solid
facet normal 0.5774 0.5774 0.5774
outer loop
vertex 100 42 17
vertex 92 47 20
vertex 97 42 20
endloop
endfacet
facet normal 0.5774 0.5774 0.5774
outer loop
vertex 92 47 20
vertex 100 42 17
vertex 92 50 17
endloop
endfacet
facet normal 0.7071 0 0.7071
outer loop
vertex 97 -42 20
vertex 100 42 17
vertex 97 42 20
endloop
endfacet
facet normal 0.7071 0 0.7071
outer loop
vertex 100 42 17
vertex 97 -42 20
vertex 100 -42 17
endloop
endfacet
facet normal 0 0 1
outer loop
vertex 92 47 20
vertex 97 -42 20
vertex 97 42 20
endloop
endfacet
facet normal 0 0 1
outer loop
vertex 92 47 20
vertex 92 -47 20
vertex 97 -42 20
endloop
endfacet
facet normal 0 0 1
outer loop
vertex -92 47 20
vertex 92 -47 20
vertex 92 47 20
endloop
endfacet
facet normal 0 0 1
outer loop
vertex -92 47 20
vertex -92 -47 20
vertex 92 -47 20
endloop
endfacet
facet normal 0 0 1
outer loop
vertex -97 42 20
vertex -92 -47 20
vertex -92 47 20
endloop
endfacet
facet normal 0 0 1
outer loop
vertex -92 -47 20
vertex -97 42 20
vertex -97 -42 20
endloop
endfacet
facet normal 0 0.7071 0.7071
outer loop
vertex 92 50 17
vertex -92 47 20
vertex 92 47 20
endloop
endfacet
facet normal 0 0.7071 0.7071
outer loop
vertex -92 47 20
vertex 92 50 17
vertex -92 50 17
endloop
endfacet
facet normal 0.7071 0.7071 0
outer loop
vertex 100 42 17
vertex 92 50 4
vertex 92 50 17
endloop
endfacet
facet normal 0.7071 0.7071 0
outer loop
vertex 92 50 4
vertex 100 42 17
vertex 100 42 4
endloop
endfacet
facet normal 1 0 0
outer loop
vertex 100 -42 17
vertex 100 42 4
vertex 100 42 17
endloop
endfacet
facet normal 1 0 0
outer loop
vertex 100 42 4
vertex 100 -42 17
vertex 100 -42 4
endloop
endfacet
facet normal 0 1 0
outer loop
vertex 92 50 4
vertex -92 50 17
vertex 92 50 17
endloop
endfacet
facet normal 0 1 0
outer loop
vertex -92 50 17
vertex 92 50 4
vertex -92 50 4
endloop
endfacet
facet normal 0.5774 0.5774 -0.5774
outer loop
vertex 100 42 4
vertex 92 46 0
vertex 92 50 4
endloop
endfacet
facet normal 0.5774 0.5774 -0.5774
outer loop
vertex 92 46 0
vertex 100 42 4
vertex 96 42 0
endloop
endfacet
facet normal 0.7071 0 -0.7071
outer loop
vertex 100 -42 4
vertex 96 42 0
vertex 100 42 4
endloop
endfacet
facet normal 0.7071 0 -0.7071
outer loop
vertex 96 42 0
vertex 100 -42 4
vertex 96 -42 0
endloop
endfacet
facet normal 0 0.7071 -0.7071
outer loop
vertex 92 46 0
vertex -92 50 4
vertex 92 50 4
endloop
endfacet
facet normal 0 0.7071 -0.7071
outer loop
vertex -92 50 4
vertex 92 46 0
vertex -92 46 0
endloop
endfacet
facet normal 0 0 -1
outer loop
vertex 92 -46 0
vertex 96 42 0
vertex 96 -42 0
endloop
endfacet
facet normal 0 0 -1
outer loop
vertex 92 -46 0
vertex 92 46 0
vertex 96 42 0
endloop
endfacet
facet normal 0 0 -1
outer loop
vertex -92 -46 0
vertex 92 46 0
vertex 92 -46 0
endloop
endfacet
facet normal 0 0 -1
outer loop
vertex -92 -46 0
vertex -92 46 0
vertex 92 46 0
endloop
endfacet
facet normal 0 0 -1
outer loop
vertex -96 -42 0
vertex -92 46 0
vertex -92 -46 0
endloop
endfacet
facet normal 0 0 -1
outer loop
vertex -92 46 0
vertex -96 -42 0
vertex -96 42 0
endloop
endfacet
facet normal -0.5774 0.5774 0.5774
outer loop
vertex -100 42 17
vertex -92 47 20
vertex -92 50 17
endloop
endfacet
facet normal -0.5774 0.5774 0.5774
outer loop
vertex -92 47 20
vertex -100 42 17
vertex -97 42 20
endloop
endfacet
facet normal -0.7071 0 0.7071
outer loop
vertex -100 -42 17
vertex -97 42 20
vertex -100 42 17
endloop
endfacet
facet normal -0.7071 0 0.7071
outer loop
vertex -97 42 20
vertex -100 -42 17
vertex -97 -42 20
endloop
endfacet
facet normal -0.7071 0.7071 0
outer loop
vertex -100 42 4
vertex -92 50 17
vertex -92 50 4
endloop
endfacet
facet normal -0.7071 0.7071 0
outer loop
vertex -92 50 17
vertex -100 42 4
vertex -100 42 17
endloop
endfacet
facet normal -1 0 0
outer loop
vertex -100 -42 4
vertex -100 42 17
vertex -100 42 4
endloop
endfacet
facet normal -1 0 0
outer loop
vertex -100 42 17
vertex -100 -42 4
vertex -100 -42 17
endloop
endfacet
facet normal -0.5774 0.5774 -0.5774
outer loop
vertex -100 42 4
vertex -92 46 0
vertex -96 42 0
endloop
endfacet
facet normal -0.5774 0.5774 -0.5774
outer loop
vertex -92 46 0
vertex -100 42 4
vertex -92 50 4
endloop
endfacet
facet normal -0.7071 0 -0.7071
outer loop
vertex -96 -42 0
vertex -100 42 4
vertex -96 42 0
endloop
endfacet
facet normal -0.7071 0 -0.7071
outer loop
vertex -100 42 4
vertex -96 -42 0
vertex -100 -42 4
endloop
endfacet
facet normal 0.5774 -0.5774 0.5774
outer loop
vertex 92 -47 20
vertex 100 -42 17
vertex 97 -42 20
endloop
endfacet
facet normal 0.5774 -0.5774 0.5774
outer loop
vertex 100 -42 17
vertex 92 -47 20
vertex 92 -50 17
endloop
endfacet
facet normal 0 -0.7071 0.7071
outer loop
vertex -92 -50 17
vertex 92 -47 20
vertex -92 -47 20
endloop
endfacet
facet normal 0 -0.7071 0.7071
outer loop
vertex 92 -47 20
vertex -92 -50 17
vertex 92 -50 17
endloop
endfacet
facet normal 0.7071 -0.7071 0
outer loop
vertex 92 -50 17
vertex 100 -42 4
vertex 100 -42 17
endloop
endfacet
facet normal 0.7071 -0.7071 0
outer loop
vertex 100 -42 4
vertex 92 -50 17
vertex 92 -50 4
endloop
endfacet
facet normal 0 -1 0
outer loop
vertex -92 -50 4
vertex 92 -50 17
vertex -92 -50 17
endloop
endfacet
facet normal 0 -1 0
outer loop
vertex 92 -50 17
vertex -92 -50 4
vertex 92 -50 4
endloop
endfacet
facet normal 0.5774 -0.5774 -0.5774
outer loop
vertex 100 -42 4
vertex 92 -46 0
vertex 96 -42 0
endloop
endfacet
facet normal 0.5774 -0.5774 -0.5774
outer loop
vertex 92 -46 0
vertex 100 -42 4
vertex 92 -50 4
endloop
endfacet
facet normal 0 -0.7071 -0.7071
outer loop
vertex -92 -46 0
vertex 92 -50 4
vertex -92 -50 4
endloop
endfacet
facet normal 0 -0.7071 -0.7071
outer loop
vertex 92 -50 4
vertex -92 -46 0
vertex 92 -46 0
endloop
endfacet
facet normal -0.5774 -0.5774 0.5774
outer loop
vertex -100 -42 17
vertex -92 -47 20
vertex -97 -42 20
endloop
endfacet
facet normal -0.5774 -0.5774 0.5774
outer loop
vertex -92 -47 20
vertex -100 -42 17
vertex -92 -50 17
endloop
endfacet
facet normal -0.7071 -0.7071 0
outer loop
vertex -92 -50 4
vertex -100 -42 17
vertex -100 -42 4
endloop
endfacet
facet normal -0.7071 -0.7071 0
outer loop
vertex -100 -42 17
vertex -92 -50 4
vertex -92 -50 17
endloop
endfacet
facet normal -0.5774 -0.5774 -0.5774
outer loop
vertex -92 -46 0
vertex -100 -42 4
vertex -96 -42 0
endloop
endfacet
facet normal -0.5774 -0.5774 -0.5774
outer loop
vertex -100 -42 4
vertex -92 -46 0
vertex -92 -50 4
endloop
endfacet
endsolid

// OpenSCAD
dim = [200, 100, 20];
bevel_top  = [3, 3];
bevel_side  = 8;
bevel_bottom  = [4, 4];


d = [dim[0]*0.5, dim[1]*0.5, dim[2]];
echo(d);

beveled_cube_q(d, bevel_top, bevel_side, bevel_bottom);
mirror([1, 0, 0])
  beveled_cube_q(d, bevel_top, bevel_side, bevel_bottom);
mirror([0, 1, 0])
  beveled_cube_q(d, bevel_top, bevel_side, bevel_bottom);
mirror([1, 0, 0]) mirror([0, 1, 0])
  beveled_cube_q(d, bevel_top, bevel_side, bevel_bottom);


module beveled_cube_q(dim, bt, bs, bb) {
  // top
  translate([0, 0, dim[2]-bt[1]])
    bevels([dim[0], dim[1], bt[1]], bt[0], bs);
  // middle
  translate([0, 0, bb[1]])
    bevels([dim[0], dim[1], dim[2]-bt[1]-bb[1]], 0, bs);
  //bottom
  translate([0, 0, bb[1]])
    mirror([0, 0, 1])
    bevels([dim[0], dim[1], bb[1]], bb[0], bs);
}

module bevels(dim, bt, bs) {
  polyhedron(
    points = [
      [0, 0, 0], // 0
      [dim[0], 0, 0], // 1
      [dim[0]-bt, 0, dim[2]], // 2
      [0, 0, dim[2]],  // 3
      [dim[0], dim[1]-bs, 0], //4 
      [dim[0]-bt, min(dim[1]-bt, dim[1]-bs), dim[2]], //5
      [0, dim[1], 0],  // 6
      [dim[0]-bs, dim[1], 0], //7 
      [min(dim[0]-bt, dim[0]-bs), dim[1]-bt, dim[2]], //8
      [0, dim[1]-bt, dim[2]] //9
    ],
    faces = [
      [3, 9, 8, 5, 2], //top
      [0, 3, 2, 1], //front
      [0, 6, 9, 3], //left 
      [6, 7, 8, 9], // back
      [7, 4, 5, 8], // back-side-bevel
      [1, 2, 5, 4], // right side
      [0, 1, 4, 7, 6] // bottom
    ]
  );
}
